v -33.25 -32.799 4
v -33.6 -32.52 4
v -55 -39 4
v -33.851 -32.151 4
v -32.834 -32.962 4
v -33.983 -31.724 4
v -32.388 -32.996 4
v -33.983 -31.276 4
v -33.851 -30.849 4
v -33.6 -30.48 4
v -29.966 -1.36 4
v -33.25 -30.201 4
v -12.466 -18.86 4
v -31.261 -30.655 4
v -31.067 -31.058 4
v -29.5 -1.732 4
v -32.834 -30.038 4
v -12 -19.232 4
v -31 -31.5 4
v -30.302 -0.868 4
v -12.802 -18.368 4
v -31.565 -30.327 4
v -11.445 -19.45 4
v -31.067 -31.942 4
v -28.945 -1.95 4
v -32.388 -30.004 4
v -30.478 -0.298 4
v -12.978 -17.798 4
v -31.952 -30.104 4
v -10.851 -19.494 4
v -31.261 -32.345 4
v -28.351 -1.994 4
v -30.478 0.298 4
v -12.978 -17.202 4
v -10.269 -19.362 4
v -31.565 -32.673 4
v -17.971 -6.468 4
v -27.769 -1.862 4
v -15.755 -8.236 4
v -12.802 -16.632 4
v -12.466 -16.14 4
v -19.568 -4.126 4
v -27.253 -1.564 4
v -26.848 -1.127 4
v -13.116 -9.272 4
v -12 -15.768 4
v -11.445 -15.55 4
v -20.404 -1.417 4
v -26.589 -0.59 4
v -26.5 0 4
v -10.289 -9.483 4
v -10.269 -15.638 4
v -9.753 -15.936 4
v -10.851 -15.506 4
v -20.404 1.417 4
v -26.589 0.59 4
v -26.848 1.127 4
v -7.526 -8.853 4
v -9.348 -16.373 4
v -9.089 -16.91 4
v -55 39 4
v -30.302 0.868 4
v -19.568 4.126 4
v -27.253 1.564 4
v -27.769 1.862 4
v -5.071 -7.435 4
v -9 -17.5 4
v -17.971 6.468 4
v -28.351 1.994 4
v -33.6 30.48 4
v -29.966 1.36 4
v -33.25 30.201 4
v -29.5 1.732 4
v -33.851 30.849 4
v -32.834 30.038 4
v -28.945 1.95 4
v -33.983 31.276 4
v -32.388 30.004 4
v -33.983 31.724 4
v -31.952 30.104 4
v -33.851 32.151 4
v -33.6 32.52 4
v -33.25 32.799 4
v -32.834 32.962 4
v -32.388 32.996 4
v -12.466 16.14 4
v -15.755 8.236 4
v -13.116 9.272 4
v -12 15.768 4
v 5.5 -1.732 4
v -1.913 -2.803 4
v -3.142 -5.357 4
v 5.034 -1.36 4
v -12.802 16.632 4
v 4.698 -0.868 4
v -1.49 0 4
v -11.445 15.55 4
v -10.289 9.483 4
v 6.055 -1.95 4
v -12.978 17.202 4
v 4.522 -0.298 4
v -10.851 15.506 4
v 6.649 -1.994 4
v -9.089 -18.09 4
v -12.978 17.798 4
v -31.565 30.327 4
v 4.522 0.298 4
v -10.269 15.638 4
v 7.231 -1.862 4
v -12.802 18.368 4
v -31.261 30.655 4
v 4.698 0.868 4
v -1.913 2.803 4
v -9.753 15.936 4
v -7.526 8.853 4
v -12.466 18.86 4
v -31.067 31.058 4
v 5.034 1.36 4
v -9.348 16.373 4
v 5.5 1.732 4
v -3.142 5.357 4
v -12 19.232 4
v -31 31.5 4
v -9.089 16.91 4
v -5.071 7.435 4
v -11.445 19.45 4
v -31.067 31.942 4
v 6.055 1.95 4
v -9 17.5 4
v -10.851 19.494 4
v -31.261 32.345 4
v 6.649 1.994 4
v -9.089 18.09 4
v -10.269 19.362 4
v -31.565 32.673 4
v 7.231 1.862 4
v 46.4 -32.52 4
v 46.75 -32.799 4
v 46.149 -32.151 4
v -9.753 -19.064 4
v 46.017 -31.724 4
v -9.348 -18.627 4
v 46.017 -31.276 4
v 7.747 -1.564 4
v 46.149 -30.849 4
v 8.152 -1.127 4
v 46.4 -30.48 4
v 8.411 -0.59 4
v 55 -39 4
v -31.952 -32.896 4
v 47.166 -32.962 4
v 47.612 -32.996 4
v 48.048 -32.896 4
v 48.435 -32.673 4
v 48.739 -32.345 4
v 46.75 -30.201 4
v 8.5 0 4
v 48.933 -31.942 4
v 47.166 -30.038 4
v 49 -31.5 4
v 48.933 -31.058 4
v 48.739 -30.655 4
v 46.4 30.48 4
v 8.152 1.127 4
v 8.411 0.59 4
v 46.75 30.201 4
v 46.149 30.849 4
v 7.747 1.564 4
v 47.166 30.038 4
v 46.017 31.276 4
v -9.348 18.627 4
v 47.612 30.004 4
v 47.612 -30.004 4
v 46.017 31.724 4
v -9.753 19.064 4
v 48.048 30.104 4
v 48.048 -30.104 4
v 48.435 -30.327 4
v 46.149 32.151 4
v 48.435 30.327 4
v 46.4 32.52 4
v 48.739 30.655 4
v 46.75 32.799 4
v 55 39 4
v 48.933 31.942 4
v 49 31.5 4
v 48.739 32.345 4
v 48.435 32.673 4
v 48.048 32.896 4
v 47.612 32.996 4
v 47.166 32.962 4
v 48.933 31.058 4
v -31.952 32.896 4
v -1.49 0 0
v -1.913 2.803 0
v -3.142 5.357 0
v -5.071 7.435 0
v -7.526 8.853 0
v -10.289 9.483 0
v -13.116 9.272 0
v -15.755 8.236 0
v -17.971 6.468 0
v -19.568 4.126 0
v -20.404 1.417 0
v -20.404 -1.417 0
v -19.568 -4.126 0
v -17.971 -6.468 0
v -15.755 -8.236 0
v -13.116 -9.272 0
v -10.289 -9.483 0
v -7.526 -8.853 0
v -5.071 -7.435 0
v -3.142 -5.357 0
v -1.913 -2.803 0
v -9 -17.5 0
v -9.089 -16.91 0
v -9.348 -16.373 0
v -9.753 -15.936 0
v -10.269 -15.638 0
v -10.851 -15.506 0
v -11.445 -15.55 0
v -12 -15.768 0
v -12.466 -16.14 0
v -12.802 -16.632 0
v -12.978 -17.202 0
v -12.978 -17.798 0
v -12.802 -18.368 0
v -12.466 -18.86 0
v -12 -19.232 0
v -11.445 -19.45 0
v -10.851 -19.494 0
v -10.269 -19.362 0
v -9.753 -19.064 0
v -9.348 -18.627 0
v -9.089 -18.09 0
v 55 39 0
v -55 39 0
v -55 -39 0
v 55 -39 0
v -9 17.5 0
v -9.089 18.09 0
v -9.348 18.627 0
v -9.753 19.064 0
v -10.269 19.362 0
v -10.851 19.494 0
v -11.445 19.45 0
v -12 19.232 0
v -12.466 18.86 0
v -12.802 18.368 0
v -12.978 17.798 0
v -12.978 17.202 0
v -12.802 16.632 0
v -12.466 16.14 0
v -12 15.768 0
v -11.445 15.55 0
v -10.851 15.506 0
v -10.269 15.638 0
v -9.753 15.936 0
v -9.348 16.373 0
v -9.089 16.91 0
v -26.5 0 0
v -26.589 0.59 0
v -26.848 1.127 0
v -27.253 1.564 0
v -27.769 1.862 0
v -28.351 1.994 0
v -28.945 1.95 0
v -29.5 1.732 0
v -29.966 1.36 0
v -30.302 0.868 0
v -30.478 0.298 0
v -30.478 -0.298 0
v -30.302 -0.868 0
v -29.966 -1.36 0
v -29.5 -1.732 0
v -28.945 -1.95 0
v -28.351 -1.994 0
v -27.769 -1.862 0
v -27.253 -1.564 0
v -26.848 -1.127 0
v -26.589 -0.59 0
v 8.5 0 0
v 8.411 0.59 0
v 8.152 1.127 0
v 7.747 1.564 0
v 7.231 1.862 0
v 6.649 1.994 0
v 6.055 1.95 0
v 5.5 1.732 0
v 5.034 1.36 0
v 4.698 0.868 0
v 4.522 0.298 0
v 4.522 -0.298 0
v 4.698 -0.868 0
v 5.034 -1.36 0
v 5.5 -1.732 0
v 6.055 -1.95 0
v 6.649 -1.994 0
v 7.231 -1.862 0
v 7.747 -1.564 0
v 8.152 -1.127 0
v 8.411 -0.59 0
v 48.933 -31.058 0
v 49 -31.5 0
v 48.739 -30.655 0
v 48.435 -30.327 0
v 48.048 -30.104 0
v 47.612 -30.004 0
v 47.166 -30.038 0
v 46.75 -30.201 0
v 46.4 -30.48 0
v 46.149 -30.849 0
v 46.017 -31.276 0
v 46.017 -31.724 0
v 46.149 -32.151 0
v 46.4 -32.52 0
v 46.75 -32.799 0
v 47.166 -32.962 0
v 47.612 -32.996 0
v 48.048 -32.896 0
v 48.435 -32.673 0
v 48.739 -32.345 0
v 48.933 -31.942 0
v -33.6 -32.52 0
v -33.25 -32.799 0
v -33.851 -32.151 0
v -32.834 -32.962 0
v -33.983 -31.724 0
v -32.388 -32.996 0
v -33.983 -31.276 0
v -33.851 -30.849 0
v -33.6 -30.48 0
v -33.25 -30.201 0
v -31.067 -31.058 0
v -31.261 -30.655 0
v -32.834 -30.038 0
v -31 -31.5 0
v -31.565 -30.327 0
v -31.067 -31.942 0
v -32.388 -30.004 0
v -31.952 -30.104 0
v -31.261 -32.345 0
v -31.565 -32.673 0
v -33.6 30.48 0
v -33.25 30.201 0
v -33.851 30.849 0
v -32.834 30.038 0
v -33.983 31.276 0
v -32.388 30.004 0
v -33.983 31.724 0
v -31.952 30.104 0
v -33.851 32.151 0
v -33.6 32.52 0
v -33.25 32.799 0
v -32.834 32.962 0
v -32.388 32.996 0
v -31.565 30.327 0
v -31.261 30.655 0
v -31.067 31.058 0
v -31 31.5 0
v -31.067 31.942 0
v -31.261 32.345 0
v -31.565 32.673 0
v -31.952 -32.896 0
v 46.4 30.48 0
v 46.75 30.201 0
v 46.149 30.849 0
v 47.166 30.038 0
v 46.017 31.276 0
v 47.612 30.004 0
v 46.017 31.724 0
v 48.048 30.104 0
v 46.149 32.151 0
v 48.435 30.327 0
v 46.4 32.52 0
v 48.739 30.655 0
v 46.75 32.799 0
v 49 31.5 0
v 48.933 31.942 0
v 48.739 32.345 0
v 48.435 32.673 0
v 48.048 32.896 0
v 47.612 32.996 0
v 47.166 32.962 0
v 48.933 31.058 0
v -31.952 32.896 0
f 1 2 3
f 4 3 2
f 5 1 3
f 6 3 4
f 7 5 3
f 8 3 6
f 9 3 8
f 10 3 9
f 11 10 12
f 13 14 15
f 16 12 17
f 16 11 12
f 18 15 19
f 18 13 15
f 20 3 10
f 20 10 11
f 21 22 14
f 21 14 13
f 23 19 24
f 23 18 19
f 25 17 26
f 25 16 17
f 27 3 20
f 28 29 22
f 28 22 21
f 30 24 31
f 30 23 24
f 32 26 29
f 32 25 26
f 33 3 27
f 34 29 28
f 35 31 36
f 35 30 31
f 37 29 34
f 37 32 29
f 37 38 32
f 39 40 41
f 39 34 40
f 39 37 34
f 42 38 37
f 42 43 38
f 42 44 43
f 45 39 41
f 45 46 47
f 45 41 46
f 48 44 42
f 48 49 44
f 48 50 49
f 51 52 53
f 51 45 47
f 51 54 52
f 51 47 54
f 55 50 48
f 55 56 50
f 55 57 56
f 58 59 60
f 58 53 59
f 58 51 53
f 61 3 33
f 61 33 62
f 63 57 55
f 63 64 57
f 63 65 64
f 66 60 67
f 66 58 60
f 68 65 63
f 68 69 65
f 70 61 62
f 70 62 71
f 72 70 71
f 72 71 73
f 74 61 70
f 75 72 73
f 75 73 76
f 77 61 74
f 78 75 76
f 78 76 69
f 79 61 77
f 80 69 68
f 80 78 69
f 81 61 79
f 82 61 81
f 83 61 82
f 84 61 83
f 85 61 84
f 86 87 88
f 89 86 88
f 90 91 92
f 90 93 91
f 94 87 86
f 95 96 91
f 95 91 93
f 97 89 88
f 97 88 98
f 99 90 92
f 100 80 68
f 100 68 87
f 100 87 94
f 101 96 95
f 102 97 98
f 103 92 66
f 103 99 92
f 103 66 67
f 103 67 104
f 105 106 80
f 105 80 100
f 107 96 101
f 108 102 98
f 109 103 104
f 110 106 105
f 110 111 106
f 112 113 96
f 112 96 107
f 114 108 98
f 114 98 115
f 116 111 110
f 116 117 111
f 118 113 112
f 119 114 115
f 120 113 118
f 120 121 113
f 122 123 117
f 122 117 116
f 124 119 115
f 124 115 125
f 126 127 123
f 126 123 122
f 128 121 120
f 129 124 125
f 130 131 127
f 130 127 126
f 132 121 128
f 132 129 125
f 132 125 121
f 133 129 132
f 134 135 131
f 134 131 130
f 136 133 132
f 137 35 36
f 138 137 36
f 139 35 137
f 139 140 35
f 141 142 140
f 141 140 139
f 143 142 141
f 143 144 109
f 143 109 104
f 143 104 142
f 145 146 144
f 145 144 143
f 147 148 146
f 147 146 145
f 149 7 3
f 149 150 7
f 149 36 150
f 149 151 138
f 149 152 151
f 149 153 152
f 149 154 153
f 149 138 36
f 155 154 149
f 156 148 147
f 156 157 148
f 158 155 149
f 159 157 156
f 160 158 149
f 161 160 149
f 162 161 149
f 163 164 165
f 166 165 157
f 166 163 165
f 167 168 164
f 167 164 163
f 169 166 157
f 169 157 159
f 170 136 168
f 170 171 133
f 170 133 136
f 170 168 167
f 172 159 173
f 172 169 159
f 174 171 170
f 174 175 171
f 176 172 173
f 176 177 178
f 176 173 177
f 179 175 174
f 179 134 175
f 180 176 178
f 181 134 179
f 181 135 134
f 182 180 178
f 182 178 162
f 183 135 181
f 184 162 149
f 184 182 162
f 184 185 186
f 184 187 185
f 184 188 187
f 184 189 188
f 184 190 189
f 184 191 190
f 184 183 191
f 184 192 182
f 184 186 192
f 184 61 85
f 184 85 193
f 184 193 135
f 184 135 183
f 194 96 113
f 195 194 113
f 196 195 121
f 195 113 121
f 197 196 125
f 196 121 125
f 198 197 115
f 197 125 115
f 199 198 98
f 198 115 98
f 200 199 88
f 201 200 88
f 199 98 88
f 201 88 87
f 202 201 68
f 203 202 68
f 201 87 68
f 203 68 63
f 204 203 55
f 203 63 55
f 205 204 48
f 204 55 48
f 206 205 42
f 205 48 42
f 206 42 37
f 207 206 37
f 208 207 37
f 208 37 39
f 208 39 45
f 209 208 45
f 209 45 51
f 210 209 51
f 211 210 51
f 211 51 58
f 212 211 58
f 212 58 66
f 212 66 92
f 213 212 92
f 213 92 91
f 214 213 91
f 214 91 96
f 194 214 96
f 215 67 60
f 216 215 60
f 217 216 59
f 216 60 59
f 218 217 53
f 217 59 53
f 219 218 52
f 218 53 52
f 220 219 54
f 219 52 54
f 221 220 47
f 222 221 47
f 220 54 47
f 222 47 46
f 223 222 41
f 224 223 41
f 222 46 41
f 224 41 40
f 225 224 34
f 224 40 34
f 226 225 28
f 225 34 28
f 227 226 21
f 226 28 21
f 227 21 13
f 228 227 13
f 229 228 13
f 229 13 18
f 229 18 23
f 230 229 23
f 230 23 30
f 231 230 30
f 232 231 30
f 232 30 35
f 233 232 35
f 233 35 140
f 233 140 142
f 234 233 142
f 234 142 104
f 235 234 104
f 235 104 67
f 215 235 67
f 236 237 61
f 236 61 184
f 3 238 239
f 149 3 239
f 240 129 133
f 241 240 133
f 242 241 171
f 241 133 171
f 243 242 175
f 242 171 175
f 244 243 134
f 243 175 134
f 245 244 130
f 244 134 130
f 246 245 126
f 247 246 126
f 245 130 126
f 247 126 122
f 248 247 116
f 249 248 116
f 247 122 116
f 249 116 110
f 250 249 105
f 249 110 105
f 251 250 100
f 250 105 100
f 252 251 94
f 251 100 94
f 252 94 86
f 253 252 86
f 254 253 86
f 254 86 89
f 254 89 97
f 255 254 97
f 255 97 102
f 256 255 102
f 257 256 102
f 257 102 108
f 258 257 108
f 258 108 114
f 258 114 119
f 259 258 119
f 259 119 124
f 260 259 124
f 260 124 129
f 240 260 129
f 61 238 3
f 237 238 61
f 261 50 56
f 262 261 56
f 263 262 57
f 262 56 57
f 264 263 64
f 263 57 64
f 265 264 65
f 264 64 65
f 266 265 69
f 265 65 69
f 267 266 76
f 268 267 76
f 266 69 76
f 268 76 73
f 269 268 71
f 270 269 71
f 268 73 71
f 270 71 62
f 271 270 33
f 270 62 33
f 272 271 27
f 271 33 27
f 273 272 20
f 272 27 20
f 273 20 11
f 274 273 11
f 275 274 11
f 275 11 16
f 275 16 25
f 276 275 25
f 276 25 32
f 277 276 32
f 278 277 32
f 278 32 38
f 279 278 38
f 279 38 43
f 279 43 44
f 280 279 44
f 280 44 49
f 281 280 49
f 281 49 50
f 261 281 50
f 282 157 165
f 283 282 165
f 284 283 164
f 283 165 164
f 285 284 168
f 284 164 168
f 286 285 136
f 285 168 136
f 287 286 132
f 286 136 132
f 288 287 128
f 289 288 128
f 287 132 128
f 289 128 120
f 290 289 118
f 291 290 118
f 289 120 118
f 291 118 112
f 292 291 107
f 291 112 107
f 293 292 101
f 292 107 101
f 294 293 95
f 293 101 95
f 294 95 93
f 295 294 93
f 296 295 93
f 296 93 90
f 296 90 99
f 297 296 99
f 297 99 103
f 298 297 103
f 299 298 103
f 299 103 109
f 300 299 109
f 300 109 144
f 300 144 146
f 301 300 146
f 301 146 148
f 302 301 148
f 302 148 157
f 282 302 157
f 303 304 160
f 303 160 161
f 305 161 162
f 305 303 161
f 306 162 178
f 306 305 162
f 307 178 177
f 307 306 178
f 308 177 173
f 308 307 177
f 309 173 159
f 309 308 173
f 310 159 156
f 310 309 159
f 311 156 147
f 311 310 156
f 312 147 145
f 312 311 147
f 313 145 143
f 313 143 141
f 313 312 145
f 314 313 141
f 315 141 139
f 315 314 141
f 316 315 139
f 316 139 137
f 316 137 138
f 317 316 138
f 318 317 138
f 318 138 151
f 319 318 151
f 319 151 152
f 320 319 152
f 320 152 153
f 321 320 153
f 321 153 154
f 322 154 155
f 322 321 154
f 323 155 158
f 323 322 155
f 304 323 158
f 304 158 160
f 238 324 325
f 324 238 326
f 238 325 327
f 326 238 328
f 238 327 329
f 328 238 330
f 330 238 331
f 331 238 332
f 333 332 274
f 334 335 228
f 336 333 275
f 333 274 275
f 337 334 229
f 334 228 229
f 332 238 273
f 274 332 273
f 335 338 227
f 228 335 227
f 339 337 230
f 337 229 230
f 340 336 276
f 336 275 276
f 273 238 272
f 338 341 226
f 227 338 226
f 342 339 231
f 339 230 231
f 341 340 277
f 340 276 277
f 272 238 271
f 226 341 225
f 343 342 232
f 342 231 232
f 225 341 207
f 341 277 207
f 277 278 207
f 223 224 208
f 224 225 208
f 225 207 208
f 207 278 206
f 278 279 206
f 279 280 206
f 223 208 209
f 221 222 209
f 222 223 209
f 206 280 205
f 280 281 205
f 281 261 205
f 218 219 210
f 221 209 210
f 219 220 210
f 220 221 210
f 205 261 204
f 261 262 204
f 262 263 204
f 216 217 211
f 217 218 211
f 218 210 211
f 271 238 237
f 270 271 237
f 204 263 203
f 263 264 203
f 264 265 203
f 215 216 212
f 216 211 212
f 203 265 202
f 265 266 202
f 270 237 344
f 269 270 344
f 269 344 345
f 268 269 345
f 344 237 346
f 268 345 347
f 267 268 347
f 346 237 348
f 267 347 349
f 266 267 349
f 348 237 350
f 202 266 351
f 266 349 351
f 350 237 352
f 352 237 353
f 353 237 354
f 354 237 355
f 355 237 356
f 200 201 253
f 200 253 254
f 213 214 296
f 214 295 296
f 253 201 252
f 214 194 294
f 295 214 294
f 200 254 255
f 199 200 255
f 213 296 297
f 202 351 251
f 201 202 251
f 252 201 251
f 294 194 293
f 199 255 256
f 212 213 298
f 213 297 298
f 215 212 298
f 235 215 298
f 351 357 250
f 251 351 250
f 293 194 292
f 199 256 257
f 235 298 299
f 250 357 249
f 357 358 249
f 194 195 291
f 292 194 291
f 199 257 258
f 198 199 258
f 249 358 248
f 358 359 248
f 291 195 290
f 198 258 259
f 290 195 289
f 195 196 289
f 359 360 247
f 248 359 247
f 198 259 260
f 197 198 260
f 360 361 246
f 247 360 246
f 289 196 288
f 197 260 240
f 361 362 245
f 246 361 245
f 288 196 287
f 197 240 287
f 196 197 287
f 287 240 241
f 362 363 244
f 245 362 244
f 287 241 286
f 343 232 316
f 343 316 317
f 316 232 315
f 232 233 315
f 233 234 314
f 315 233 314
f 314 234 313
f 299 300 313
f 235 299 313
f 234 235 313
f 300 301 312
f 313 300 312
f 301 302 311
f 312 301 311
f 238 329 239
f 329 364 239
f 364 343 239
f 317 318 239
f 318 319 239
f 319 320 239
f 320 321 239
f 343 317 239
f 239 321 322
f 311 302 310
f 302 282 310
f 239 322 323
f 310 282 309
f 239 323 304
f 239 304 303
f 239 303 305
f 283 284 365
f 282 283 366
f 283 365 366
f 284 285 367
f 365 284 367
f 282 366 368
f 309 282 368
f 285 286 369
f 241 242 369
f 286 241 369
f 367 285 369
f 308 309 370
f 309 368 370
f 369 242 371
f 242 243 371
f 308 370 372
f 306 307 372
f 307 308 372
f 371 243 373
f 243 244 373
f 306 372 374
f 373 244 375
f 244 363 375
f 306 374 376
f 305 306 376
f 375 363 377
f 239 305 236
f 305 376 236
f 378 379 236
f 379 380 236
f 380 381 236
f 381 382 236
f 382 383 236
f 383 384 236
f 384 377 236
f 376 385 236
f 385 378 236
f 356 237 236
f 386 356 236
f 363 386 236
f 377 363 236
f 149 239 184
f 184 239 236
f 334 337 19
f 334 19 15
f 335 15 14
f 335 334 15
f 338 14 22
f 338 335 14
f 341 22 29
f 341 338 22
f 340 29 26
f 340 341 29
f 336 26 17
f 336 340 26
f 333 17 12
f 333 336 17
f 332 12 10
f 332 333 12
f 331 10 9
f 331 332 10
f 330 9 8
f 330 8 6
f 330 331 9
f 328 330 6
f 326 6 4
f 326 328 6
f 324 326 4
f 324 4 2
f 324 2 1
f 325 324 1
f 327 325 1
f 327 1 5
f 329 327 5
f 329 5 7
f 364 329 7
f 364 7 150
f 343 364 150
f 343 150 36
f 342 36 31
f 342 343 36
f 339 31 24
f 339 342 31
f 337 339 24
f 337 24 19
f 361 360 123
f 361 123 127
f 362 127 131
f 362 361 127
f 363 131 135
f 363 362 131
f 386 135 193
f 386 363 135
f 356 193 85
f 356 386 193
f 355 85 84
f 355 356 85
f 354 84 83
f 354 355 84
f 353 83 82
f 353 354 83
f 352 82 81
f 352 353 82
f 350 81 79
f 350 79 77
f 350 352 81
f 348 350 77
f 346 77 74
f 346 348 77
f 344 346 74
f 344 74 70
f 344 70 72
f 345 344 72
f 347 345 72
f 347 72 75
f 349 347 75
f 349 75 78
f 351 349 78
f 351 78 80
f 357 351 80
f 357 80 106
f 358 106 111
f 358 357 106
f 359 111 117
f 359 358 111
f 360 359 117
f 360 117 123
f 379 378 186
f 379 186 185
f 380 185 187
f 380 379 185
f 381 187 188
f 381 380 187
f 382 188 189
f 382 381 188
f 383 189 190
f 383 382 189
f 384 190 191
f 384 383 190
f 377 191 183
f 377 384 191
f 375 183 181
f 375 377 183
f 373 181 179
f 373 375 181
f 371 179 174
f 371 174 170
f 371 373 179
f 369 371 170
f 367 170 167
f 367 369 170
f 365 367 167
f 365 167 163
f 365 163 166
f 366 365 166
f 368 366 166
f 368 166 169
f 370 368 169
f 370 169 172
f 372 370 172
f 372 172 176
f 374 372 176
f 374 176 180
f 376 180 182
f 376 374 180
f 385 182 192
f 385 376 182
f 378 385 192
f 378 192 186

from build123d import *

# Parameters (mm, degrees)
SKETCH_1_W          = 110
SKETCH_1_H          = 78
SKETCH_1_R          = 1.5
EXTRUDE_1_DEPTH     = 4
SKETCH_4_R          = 2
SKETCH_4_R_2        = 9.51
CUT_EXTRUDE_1_DEPTH = 68.542579163


with BuildPart() as part:
    # 草图1 → 凸台-拉伸1 (new body)
    with BuildSketch(Plane.XY):
        Rectangle(SKETCH_1_W, SKETCH_1_H)
        with Locations((-32.5, 31.5)):
            Circle(SKETCH_1_R, mode=Mode.SUBTRACT)
        with Locations((47.5, 31.5)):
            Circle(SKETCH_1_R, mode=Mode.SUBTRACT)
        with Locations((47.5, -31.5)):
            Circle(SKETCH_1_R, mode=Mode.SUBTRACT)
        with Locations((-32.5, -31.5)):
            Circle(SKETCH_1_R, mode=Mode.SUBTRACT)
    extrude(amount=EXTRUDE_1_DEPTH)

    # 草图4 → 切除-拉伸1 (cut, through all)
    with BuildSketch(Plane.XY.offset(4)):
        with Locations((-11, 17.5)):
            Circle(SKETCH_4_R)
        with Locations((-28.5, 0)):
            Circle(SKETCH_4_R)
        with Locations((-11, -17.5)):
            Circle(SKETCH_4_R)
        with Locations((6.5, 0)):
            Circle(SKETCH_4_R)
        with Locations((-11, 0)):
            Circle(SKETCH_4_R_2)
    extrude(amount=-CUT_EXTRUDE_1_DEPTH, mode=Mode.SUBTRACT)


solid = part.part
